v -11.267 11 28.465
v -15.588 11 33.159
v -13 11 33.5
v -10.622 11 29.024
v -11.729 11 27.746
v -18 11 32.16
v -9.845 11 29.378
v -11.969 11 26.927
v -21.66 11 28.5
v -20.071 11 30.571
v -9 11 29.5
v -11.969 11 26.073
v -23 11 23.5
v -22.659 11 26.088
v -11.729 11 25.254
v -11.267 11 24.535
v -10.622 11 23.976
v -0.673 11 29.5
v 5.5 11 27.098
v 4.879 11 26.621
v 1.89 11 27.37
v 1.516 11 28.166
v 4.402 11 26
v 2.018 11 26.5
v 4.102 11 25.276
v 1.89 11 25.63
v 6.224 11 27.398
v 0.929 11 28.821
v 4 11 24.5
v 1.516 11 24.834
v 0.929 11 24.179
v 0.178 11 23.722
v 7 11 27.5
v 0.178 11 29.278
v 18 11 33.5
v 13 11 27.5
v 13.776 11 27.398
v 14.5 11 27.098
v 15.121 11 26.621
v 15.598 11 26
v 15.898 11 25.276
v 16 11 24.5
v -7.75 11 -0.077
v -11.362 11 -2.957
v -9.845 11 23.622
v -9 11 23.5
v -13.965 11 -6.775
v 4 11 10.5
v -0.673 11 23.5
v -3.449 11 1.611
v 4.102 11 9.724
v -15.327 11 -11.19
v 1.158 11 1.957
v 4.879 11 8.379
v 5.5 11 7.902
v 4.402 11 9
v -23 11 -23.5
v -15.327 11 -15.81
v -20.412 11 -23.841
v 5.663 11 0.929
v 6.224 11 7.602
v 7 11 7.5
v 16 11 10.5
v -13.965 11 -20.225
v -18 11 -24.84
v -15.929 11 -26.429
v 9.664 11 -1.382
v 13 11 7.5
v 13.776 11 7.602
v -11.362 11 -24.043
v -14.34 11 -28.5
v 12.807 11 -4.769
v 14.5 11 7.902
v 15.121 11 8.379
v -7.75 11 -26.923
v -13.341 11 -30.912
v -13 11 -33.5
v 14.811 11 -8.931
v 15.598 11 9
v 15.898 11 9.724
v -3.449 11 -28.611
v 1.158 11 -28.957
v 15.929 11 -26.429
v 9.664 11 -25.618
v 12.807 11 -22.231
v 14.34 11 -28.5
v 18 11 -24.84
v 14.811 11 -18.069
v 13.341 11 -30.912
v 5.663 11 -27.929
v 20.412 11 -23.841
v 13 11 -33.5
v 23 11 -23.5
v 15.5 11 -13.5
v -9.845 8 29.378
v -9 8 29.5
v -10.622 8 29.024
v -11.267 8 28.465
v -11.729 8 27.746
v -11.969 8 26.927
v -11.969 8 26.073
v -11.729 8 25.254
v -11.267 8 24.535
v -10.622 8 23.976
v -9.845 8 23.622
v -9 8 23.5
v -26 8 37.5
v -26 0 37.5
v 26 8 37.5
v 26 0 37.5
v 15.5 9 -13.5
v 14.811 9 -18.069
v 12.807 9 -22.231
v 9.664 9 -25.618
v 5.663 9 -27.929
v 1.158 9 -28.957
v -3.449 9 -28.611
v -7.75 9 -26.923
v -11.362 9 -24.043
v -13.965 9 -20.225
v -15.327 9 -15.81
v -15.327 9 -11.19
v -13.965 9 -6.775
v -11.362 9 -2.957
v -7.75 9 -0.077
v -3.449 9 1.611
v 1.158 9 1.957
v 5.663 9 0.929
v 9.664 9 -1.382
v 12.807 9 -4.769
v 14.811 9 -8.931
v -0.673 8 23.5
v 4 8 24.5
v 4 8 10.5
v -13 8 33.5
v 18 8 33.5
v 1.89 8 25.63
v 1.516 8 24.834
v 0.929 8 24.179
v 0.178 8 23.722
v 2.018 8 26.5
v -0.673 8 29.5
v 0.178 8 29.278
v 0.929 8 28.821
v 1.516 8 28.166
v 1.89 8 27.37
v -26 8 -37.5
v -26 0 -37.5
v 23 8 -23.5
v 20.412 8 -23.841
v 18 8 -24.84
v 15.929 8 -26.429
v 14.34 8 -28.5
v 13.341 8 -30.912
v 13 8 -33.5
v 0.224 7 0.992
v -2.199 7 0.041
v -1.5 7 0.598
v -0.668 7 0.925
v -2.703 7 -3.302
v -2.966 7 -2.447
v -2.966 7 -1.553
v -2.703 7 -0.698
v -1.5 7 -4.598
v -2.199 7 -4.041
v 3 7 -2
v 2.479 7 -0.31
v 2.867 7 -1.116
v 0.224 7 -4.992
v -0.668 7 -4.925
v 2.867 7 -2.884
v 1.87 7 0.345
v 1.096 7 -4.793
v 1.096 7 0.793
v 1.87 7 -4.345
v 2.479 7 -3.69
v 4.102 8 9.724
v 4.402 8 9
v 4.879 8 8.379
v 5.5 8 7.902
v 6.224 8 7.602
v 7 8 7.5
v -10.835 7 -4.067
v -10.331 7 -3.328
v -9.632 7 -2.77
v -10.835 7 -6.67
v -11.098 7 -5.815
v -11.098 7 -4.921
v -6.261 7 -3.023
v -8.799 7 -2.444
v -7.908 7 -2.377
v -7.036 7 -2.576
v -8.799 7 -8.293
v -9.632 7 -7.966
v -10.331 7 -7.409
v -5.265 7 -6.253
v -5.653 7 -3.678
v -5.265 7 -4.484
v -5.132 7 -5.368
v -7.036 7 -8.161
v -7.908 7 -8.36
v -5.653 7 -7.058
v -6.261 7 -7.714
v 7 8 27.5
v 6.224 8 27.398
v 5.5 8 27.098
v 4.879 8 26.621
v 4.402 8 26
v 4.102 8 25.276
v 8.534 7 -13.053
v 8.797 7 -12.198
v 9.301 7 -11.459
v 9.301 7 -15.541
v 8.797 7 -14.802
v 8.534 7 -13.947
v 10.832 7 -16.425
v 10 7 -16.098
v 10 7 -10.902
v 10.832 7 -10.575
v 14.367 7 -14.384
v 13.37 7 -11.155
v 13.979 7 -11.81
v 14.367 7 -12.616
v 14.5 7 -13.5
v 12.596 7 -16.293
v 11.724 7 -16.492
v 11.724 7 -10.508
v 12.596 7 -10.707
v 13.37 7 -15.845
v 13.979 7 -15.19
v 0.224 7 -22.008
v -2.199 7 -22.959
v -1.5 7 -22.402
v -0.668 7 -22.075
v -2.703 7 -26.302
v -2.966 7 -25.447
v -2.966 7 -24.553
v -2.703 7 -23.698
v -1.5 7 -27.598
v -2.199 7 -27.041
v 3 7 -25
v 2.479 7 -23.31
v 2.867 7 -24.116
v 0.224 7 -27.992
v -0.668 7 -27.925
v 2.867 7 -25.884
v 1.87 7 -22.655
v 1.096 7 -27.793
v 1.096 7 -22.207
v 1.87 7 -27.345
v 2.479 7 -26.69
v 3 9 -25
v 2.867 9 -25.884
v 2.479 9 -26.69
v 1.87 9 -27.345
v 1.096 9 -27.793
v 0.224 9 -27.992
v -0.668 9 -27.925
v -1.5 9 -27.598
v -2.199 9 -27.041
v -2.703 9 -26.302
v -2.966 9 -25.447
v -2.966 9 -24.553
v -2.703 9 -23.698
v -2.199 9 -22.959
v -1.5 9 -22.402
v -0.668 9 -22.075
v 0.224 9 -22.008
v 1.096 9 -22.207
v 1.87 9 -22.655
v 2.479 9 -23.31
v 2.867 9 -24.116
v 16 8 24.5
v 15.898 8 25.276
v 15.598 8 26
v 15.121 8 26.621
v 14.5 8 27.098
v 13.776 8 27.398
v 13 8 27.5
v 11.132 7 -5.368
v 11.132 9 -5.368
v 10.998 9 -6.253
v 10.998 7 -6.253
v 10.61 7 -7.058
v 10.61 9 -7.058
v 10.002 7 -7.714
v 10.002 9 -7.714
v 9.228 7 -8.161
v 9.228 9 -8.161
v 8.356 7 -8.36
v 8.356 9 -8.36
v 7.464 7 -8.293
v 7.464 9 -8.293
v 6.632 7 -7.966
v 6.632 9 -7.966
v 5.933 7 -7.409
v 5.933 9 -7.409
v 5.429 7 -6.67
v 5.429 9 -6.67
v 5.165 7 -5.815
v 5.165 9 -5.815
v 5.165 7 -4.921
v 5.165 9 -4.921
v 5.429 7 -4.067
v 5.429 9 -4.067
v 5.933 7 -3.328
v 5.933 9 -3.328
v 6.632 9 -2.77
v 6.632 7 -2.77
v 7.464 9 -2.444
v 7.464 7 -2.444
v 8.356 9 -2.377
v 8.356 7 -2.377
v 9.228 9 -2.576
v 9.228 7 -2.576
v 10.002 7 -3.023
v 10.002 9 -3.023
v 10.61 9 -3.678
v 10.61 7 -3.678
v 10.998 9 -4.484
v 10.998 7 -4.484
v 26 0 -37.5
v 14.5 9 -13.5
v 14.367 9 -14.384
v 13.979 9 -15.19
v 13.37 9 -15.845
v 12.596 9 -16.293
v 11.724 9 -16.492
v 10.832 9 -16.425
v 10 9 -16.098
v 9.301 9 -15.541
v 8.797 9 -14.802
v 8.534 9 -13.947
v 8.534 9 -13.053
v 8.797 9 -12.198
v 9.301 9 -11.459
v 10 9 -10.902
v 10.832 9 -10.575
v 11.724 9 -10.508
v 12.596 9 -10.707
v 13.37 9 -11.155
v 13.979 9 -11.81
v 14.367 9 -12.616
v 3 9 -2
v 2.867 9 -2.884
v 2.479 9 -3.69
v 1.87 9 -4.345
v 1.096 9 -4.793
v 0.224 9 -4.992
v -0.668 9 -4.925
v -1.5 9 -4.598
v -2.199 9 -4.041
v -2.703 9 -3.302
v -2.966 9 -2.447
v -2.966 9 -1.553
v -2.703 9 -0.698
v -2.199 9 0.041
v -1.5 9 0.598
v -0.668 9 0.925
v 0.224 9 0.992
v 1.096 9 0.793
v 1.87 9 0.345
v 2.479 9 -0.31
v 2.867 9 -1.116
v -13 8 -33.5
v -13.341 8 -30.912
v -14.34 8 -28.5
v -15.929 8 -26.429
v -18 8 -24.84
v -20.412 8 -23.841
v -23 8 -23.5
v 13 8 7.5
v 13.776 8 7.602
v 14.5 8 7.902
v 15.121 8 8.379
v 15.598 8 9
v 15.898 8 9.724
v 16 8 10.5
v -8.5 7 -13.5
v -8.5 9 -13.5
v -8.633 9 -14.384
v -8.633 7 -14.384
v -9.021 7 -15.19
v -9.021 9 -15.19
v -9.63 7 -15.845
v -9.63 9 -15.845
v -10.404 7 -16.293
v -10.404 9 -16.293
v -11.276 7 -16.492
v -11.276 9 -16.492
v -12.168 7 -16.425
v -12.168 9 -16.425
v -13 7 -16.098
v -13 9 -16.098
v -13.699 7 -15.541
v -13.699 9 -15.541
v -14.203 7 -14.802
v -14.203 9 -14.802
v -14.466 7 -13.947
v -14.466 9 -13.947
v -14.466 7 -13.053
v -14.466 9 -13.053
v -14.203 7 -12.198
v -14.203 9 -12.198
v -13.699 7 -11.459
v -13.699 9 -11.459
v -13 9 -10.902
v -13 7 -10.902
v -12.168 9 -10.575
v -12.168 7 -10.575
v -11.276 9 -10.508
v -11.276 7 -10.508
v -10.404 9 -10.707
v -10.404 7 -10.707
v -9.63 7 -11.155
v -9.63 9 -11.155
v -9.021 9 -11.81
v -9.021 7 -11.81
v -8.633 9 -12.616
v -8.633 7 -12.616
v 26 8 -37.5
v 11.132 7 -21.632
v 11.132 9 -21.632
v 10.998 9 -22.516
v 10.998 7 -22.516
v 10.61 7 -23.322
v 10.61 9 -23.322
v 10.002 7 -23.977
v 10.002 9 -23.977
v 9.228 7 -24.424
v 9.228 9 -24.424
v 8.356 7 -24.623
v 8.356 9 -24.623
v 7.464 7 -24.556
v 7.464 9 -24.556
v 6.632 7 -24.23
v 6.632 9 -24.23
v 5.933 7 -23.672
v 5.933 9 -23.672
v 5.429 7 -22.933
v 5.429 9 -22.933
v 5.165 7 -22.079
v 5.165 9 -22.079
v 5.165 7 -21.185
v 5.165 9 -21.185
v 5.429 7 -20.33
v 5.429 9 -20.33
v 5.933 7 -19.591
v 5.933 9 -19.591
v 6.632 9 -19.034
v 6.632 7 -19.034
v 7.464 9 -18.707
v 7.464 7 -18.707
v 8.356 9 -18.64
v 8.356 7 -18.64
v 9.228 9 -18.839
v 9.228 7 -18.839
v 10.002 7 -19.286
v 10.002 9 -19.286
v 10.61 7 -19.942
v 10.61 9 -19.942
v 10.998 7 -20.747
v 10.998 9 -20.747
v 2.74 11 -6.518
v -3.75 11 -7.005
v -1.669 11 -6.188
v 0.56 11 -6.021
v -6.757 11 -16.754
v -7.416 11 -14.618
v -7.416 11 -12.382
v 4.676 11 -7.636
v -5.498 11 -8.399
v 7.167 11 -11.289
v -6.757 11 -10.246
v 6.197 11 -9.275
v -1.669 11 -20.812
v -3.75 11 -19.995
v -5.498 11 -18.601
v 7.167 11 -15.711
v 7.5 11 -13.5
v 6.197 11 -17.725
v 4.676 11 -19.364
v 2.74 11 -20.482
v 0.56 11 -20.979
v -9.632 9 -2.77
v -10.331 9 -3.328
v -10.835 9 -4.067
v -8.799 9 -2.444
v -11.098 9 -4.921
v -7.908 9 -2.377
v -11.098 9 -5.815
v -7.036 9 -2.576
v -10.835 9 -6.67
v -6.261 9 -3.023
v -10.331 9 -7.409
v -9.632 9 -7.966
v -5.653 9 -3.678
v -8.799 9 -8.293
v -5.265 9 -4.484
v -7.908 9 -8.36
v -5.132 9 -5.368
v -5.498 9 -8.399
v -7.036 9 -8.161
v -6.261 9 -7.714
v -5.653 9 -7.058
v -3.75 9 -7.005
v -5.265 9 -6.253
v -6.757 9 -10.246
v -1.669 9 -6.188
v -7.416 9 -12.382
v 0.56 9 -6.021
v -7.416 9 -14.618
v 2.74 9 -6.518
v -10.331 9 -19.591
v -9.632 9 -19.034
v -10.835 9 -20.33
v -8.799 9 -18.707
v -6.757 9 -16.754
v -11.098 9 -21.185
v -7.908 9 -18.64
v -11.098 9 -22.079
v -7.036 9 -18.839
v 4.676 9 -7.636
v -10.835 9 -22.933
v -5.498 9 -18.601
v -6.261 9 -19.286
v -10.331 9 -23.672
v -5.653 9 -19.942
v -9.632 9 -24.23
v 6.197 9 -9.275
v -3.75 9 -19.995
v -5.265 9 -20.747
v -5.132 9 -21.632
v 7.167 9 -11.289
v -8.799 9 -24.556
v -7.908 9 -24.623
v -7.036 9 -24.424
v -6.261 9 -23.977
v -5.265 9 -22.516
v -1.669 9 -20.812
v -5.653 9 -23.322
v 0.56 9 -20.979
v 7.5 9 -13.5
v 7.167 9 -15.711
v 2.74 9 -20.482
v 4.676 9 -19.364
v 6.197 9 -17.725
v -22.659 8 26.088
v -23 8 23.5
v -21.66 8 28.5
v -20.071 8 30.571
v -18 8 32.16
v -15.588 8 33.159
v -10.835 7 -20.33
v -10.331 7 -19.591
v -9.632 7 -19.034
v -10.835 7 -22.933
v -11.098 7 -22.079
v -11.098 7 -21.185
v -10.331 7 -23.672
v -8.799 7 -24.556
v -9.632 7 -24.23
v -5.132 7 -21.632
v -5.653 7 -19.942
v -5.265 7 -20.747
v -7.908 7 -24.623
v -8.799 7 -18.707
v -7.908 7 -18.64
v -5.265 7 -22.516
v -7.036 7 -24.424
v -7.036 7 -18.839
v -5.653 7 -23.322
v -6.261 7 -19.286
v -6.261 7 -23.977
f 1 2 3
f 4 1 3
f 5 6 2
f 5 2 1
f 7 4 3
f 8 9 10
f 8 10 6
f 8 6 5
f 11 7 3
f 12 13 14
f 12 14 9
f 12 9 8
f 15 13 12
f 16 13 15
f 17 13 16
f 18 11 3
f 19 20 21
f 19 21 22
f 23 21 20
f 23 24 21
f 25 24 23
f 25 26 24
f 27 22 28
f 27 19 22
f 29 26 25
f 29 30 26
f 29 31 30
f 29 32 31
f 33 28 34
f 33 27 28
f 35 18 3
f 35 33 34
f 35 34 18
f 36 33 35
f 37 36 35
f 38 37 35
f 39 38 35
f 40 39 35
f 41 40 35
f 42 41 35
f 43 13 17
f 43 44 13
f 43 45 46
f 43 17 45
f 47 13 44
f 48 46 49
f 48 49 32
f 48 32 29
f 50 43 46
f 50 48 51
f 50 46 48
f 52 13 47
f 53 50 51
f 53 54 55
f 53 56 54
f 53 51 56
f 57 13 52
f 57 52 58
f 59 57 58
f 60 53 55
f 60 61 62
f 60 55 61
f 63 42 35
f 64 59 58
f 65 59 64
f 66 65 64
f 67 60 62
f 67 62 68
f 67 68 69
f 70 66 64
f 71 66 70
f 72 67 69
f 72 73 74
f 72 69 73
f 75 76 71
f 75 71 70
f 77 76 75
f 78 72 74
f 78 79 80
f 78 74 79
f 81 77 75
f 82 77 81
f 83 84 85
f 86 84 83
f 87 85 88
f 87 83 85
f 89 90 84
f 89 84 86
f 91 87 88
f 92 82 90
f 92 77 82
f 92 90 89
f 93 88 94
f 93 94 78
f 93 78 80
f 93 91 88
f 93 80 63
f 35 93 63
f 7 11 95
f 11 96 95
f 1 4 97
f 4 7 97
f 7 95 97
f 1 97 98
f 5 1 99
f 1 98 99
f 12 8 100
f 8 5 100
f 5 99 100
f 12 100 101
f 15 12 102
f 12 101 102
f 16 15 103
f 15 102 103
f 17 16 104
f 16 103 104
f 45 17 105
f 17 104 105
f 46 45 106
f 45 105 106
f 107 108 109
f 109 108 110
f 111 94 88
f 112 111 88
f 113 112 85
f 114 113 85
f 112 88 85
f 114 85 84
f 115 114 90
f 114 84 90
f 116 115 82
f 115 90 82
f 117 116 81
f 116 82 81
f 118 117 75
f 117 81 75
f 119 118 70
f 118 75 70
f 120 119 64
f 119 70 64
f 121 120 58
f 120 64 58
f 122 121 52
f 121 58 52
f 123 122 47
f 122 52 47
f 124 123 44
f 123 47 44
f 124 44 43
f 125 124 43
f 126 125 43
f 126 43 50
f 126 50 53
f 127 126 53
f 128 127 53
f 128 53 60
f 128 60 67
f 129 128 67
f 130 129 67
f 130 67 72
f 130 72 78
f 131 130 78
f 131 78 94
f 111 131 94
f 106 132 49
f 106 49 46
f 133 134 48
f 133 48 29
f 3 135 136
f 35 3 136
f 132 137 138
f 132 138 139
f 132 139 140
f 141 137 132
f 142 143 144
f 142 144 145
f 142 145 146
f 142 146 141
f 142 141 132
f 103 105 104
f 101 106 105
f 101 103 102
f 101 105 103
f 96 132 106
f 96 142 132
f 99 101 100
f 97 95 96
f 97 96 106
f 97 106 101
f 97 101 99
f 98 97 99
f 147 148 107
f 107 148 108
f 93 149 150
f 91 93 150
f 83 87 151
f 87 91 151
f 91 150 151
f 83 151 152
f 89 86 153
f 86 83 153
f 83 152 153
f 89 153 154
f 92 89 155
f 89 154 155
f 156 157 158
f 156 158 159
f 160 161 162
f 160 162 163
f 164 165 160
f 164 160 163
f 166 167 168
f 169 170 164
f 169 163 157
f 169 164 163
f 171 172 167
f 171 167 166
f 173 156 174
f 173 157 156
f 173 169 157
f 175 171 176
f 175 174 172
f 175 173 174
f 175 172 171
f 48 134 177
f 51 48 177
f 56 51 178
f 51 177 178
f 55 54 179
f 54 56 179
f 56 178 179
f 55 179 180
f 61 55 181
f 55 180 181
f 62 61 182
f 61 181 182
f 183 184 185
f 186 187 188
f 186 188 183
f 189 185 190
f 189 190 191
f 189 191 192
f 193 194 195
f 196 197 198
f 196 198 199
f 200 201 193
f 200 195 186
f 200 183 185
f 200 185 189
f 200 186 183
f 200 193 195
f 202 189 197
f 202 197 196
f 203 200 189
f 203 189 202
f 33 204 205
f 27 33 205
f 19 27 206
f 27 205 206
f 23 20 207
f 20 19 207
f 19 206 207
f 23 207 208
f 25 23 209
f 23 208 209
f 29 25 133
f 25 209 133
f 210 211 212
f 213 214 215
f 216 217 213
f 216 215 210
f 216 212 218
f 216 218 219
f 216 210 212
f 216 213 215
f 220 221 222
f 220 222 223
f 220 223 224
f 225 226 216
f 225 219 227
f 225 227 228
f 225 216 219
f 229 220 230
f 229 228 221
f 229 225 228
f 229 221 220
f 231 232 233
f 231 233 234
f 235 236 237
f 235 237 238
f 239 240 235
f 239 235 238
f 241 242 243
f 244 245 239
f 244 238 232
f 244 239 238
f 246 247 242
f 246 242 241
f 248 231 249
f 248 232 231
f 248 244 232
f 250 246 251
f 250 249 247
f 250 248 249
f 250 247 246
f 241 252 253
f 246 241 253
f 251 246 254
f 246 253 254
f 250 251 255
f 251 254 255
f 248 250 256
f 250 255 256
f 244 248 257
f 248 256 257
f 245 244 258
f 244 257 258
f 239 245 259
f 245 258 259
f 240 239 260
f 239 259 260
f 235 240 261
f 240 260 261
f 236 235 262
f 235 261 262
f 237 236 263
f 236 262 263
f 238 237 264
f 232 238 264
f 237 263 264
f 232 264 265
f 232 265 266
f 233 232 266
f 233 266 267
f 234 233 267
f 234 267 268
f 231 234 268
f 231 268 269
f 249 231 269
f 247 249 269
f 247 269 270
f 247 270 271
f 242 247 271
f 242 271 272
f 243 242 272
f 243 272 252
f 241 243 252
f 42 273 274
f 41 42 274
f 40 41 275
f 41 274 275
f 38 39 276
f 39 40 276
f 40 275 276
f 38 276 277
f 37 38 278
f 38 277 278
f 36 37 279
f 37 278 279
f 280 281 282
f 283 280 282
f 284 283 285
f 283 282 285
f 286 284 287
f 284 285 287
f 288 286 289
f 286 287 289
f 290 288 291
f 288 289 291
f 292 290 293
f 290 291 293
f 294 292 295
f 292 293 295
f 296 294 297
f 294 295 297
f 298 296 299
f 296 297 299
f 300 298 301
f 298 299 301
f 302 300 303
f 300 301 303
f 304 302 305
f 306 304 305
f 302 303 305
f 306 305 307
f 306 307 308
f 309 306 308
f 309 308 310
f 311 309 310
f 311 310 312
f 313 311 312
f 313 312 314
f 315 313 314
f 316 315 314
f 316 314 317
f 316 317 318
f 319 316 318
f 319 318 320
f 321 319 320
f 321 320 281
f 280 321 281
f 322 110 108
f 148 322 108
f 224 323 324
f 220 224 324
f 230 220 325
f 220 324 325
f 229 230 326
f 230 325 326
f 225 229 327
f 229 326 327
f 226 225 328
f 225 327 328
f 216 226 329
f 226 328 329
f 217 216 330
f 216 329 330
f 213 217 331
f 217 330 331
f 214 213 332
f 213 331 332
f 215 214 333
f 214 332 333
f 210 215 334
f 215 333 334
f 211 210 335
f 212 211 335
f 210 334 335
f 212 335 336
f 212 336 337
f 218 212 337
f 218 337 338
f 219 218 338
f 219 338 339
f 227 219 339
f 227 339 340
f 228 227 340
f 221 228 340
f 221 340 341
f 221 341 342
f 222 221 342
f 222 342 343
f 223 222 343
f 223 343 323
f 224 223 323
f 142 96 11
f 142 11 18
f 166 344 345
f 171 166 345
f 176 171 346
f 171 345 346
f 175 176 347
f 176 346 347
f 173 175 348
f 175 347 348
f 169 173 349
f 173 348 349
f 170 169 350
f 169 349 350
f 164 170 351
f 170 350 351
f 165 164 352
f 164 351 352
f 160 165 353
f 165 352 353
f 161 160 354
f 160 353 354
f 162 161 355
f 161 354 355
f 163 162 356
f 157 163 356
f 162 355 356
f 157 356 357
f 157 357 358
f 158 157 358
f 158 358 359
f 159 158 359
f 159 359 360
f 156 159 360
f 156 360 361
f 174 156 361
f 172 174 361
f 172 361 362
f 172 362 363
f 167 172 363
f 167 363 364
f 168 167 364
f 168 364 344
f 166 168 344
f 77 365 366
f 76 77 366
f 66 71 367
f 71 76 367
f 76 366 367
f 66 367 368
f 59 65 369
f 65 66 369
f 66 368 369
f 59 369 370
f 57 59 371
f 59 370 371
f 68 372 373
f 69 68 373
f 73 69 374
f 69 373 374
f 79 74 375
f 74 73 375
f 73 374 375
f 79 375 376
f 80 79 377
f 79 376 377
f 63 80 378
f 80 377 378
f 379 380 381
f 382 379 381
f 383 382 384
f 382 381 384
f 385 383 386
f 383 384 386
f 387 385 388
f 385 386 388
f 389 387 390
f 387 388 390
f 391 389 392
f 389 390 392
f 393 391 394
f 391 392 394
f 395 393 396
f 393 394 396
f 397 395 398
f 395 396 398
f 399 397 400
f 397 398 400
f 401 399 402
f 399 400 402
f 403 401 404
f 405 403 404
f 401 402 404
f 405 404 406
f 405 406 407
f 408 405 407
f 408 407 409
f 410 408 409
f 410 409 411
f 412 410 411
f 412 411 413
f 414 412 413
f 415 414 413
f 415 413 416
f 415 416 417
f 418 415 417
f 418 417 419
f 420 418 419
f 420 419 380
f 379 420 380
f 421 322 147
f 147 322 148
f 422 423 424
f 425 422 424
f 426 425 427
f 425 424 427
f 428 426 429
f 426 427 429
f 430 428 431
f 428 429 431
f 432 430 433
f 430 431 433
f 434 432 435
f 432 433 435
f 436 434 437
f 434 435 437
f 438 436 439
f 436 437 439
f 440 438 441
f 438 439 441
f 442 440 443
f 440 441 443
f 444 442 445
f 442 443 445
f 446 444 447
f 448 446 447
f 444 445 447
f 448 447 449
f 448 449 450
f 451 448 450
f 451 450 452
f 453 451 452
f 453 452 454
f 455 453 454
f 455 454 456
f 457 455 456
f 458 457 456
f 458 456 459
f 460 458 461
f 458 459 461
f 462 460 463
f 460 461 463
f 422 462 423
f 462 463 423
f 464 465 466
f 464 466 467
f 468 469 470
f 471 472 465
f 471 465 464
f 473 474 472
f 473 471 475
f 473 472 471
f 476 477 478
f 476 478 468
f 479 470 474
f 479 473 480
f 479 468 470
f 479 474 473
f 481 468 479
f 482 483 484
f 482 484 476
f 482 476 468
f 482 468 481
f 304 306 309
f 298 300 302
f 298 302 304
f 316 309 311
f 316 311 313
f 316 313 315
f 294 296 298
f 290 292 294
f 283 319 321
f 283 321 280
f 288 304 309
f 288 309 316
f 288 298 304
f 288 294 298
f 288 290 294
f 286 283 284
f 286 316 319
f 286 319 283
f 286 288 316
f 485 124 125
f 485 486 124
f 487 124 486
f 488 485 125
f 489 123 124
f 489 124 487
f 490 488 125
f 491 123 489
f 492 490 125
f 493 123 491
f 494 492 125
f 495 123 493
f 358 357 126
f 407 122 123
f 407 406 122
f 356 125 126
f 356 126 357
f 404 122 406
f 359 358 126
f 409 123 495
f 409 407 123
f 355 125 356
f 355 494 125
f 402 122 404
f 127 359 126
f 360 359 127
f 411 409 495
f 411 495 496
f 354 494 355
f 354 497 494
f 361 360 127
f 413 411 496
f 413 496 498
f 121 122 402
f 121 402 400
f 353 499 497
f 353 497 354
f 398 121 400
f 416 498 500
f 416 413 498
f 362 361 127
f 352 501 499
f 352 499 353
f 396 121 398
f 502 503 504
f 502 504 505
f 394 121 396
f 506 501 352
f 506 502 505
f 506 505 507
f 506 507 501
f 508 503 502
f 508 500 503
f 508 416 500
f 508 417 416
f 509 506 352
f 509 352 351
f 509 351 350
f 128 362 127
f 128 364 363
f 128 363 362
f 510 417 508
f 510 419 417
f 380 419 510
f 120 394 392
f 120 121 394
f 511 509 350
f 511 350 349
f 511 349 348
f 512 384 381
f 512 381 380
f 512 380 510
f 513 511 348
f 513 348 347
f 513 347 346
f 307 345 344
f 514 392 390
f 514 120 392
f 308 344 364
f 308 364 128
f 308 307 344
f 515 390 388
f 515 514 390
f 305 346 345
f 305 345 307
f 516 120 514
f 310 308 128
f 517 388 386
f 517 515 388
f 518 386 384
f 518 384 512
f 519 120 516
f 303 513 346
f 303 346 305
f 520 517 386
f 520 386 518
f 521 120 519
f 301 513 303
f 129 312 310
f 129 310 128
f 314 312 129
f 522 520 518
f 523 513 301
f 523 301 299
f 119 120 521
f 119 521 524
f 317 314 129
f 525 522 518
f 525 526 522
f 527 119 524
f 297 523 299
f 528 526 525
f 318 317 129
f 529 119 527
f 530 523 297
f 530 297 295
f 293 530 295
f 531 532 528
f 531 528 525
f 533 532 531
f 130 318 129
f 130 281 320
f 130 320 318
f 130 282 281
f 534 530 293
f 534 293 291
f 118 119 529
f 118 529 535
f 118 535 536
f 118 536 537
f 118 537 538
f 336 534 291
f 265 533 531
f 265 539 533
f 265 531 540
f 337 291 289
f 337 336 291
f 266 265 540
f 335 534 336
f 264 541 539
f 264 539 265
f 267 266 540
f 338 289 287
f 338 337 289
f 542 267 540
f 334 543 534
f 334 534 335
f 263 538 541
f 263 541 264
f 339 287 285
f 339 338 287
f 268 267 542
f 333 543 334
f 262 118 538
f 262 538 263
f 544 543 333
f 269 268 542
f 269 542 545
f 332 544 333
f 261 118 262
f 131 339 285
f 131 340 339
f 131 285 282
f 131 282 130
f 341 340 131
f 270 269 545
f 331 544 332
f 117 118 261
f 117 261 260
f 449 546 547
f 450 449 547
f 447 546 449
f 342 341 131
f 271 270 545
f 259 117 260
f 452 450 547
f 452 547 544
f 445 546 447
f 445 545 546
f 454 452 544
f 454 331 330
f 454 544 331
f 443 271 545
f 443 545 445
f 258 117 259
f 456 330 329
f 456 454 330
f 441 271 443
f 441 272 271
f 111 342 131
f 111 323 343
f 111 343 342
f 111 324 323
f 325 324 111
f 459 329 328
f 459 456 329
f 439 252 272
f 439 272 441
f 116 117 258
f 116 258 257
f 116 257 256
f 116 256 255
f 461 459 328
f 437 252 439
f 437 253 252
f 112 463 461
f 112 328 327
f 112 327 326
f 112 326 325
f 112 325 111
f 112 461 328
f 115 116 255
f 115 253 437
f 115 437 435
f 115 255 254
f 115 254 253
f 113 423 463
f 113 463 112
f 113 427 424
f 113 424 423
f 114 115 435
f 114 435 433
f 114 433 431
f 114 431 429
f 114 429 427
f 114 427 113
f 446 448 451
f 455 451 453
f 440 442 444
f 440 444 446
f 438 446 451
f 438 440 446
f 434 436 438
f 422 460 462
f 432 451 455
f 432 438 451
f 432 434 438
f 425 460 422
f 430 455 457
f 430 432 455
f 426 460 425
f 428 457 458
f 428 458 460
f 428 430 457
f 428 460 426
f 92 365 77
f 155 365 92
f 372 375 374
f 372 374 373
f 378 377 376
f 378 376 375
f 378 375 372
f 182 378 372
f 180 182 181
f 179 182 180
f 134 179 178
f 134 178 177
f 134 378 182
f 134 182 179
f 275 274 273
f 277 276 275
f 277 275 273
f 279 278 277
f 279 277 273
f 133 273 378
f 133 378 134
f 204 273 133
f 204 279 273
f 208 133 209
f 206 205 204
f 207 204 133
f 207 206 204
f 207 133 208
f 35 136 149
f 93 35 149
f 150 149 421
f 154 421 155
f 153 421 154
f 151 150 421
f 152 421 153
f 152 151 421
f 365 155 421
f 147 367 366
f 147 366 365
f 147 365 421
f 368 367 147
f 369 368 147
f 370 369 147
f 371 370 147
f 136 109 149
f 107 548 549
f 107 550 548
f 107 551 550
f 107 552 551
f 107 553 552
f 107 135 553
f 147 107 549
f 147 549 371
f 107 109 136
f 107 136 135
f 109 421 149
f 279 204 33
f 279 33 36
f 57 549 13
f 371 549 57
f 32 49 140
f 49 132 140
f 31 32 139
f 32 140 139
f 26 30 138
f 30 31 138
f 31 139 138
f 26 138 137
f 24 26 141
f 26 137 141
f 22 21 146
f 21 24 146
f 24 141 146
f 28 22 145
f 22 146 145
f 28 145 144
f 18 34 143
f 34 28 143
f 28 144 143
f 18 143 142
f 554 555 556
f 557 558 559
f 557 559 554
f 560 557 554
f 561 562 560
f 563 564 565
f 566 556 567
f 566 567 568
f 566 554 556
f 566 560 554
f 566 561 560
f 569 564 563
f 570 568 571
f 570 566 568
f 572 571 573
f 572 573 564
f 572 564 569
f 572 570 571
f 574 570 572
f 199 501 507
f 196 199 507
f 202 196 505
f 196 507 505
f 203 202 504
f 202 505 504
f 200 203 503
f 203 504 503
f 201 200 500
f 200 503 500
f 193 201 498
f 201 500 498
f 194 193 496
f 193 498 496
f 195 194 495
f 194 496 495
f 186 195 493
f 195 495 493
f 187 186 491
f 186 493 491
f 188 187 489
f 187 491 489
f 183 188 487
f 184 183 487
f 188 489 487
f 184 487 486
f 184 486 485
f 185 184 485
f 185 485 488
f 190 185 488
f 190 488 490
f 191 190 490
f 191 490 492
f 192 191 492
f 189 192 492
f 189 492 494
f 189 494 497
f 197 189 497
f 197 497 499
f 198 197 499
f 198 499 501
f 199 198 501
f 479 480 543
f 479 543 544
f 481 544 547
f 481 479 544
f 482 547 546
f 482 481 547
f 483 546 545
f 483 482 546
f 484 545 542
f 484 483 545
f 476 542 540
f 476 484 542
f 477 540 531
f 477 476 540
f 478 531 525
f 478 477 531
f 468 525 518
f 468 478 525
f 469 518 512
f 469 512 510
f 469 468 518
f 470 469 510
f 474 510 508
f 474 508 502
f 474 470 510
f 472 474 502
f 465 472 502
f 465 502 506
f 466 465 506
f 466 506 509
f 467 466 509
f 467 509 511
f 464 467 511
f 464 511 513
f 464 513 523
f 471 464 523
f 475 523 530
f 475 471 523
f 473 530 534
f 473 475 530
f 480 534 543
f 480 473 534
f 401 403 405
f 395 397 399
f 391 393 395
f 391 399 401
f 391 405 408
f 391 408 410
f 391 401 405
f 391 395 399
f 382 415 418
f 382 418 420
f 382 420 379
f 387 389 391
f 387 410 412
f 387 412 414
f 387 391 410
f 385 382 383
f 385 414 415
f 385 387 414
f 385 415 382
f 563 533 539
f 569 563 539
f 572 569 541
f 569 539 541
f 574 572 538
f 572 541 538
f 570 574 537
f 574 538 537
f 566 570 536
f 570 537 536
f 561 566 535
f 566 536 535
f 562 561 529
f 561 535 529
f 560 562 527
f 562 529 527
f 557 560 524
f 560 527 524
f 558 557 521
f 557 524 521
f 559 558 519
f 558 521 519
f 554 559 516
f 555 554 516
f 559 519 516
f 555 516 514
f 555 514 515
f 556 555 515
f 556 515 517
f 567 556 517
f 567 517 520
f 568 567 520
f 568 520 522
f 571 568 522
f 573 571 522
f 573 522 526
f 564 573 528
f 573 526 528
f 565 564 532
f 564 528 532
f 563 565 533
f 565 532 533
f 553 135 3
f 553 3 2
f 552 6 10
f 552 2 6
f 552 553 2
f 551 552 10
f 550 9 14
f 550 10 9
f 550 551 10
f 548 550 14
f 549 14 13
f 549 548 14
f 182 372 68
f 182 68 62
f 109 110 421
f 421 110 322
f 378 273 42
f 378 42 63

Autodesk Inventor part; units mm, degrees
ref_plane "YZ Plane" through (0, 0, 0) normal (1, 0, 0) x (0, 1, 0)
ref_plane "XZ Plane" through (0, 0, 0) normal (0, 1, 0) x (-1, 0, 0)
ref_plane "XY Plane" through (0, 0, 0) normal (0, 0, 1) x (1, 0, 0)
sketch "Sketch1" plane through (0, 0, 0) normal (0, 1, 0) x (-1, 0, 0)
  line L0 (26, 37.5) -> (-26, 37.5)
  line L1 (-26, 37.5) -> (-26, -37.5)
  line L2 (-26, -37.5) -> (26, -37.5)
  line L3 (26, -37.5) -> (26, 37.5)
  line L4 (26, 37.5) -> (-26, -37.5) construction
  line L5 (-26, 37.5) -> (26, -37.5) construction
  point P0 (0, 0)
  dimension "d0" = 52
  dimension "d1" = 75
extrude "Extrusion1" add sketch "Sketch1" along normal blind 8
sketch "Sketch2" plane through (0, 8, 0) normal (0, 1, 0) x (1, 0, 0)
  arc A0 (-23, 23.5) -> (-13, 33.5) centre (-23, 33.5) ccw
  line L0 (26, 37.5) -> (-26, 37.5) projected
  line L1 (-26, 37.5) -> (-26, -37.5) projected
  arc A1 (13, 33.5) -> (23, 23.5) centre (23, 33.5) ccw
  line L2 (26, -37.5) -> (26, 37.5) projected
  line L3 (-13, 33.5) -> (13, 33.5)
  line L4 (-23, -23.5) -> (-23, 27.9055)
  arc A2 (-23, -23.5) -> (-13, -33.5) centre (-13, -23.5) ccw
  line L5 (-13, -33.5) -> (18, -33.5)
  line L6 (-26, -37.5) -> (26, -37.5) projected
  line L7 (18, -33.5) -> (23, 23.5)
  line L8 (7, -27.5) -> (13, -27.5)
  line L9 (16, -24.5) -> (16, -10.5)
  line L10 (13, -7.5) -> (7, -7.5)
  line L11 (4, -10.5) -> (4, -24.5)
  line L12 (4, -27.5) -> (16, -7.5) construction
  line L13 (16, -27.5) -> (4, -7.5) construction
  line L14 (-9, -29.5) -> (-0.6728, -29.5)
  line L15 (-0.6728, -23.5) -> (-9, -23.5)
  line L16 (-9, -29.5) -> (-0.6728, -23.5) construction
  line L17 (-0.6728, -29.5) -> (-9, -23.5) construction
  arc A3 (-9, -23.5) -> (-9, -29.5) centre (-9, -26.5) ccw
  arc A4 (-0.6728, -29.5) -> (-0.6728, -23.5) centre (-1, -26.5) ccw
  arc A5 (4, -24.5) -> (7, -27.5) centre (7, -24.5) ccw
  arc A6 (7, -7.5) -> (4, -10.5) centre (7, -10.5) ccw
  arc A7 (16, -10.5) -> (13, -7.5) centre (13, -10.5) ccw
  arc A8 (13, -27.5) -> (16, -24.5) centre (13, -24.5) ccw
  point P0 (0, 0)
  point P1 (10, -17.5)
  point P2 (-4.8364, -26.5)
  dimension "d4" = 20
  dimension "d5" = 4
  dimension "d6" = 3
  dimension "d7" = 4
  dimension "d8" = 3
  dimension "d9" = 20
  dimension "d10" = 3
  dimension "d14" = 3
  dimension "d15" = 4
  dimension "d18" = 8
  dimension "d19" = 16
  dimension "d20" = 22
  dimension "d22" = 4
  dimension "d23" = 20
  dimension "d24" = 30
  dimension "d25" = 10
  dimension "d26" = 6
  dimension "d27" = 6
  dimension "d29" = 11
  dimension "d30" = 27
  dimension "d31" = 35
  dimension "d32" = 49
  dimension "d33" = 52
  dimension "d38" = 3
extrude "Extrusion2" add sketch "Sketch2" along normal blind 3 contours A0 L3 A1 L7 L5 A2 L4
sketch "Sketch3" plane through (0, 11, 0) normal (0, 1, 0) x (1, 0, 0)
  circle A0 centre (0, 13.5) radius 15.5
  circle A1 centre (0, 13.5) radius 7.5
  line L0 (-26, -37.5) -> (26, -37.5) projected
  line L1 (26, -37.5) -> (26, 37.5) projected
  point P0 (0, 0)
  dimension "d41" = 15
  dimension "d42" = 31
  dimension "d43" = 51
  dimension "d44" = 26
extrude "Extrusion3" cut sketch "Sketch3" against normal blind 2
sketch "Sketch4" plane through (0, 9, -13.5) normal (0, 1, 0) x (1, 0, 0)
  circle A0 centre (0, 0) radius 7.5 projected
  circle A1 centre (0, 0) radius 11.5
  circle A2 centre (11.5, 0) radius 3
  circle A3 centre (8.1317, 8.1317) radius 3
  circle A4 centre (0, 11.5) radius 3
  circle A5 centre (-8.1317, 8.1317) radius 3
  circle A6 centre (-11.5, 0) radius 3
  circle A7 centre (-8.1317, -8.1317) radius 3
  circle A8 centre (0, -11.5) radius 3
  circle A9 centre (8.1317, -8.1317) radius 3
  point P0 (0, -13.5)
  dimension "d47" = 23
  dimension "d48" = 6
  dimension "d51" = 360
extrude "Extrusion4" cut sketch "Sketch4" against normal blind 2 contours A1 A2 | A1 A2 | A3 A1 | A1 A3 | A9 A1 | A1 A9 | A4 A1 | A1 A4 | A8 A1 | A1 A8 | A5 A1 | A1 A5 | A7 A1 | A1 A7 | A6 A1 | A1 A6
properties part number "Exercise2"
